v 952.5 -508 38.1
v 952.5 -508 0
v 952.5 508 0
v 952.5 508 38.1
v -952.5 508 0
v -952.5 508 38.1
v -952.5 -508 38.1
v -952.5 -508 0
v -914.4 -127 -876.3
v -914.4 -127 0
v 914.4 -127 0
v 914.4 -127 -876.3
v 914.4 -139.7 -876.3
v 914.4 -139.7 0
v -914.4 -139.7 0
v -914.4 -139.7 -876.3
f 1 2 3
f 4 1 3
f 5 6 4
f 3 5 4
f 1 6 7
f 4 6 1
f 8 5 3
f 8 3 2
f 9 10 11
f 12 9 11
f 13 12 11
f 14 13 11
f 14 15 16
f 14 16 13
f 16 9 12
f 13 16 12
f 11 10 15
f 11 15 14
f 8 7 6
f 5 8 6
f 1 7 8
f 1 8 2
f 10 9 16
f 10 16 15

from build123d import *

# Parameters (mm, degrees)
F0_W     = 38.1
F0_H     = 1016
F0_W_2   = 1828.8
F1_DEPTH = 38.1
F2_DEPTH = 876.3
F4_W     = 1828.8
F4_H     = 876.3
F5_DEPTH = 12.7
F6_W     = 1016
F6_H     = 876.3
F7_DEPTH = 38.1
F8_W     = 1016
F8_H     = 876.3
F9_DEPTH = 38.1


with BuildPart() as f1:
    # F0 (on Top) → F1 (new body)
    with BuildSketch(Plane.XY):
        with Locations((-933.45, 0)):
            Rectangle(F0_W, F0_H)
        Rectangle(F0_W_2, F0_H)
        with Locations((933.45, 0)):
            Rectangle(F0_W, F0_H)
    extrude(amount=F1_DEPTH)

    # F0 (on Top) → F2 (join)
    with BuildSketch(Plane.XY):
        with Locations((-933.45, 0)):
            Rectangle(F0_W, F0_H)
        with Locations((933.45, 0)):
            Rectangle(F0_W, F0_H)
    extrude(amount=-F2_DEPTH)

    # F6 (on face) → F7 (cut)
    with BuildSketch(Plane.YZ.offset(952.5)):
        with Locations((0, -438.15)):
            Rectangle(F6_W, F6_H)
    extrude(amount=-F7_DEPTH, mode=Mode.SUBTRACT)

    # F8 (on face) → F9 (cut)
    with BuildSketch(Plane(origin=(-952.5, 0, 0), x_dir=(0, -1, 0), z_dir=(-1, 0, 0))):
        with Locations((0, -438.15)):
            Rectangle(F8_W, F8_H)
    extrude(amount=-F9_DEPTH, mode=Mode.SUBTRACT)


with BuildPart() as f5:
    # F4 (on offset) → F5 (new body)
    with BuildSketch(Plane.XZ.offset(127)):
        with Locations((0, -438.15)):
            Rectangle(F4_W, F4_H)
    extrude(amount=F5_DEPTH)


solid = Compound([f1.part, f5.part])
